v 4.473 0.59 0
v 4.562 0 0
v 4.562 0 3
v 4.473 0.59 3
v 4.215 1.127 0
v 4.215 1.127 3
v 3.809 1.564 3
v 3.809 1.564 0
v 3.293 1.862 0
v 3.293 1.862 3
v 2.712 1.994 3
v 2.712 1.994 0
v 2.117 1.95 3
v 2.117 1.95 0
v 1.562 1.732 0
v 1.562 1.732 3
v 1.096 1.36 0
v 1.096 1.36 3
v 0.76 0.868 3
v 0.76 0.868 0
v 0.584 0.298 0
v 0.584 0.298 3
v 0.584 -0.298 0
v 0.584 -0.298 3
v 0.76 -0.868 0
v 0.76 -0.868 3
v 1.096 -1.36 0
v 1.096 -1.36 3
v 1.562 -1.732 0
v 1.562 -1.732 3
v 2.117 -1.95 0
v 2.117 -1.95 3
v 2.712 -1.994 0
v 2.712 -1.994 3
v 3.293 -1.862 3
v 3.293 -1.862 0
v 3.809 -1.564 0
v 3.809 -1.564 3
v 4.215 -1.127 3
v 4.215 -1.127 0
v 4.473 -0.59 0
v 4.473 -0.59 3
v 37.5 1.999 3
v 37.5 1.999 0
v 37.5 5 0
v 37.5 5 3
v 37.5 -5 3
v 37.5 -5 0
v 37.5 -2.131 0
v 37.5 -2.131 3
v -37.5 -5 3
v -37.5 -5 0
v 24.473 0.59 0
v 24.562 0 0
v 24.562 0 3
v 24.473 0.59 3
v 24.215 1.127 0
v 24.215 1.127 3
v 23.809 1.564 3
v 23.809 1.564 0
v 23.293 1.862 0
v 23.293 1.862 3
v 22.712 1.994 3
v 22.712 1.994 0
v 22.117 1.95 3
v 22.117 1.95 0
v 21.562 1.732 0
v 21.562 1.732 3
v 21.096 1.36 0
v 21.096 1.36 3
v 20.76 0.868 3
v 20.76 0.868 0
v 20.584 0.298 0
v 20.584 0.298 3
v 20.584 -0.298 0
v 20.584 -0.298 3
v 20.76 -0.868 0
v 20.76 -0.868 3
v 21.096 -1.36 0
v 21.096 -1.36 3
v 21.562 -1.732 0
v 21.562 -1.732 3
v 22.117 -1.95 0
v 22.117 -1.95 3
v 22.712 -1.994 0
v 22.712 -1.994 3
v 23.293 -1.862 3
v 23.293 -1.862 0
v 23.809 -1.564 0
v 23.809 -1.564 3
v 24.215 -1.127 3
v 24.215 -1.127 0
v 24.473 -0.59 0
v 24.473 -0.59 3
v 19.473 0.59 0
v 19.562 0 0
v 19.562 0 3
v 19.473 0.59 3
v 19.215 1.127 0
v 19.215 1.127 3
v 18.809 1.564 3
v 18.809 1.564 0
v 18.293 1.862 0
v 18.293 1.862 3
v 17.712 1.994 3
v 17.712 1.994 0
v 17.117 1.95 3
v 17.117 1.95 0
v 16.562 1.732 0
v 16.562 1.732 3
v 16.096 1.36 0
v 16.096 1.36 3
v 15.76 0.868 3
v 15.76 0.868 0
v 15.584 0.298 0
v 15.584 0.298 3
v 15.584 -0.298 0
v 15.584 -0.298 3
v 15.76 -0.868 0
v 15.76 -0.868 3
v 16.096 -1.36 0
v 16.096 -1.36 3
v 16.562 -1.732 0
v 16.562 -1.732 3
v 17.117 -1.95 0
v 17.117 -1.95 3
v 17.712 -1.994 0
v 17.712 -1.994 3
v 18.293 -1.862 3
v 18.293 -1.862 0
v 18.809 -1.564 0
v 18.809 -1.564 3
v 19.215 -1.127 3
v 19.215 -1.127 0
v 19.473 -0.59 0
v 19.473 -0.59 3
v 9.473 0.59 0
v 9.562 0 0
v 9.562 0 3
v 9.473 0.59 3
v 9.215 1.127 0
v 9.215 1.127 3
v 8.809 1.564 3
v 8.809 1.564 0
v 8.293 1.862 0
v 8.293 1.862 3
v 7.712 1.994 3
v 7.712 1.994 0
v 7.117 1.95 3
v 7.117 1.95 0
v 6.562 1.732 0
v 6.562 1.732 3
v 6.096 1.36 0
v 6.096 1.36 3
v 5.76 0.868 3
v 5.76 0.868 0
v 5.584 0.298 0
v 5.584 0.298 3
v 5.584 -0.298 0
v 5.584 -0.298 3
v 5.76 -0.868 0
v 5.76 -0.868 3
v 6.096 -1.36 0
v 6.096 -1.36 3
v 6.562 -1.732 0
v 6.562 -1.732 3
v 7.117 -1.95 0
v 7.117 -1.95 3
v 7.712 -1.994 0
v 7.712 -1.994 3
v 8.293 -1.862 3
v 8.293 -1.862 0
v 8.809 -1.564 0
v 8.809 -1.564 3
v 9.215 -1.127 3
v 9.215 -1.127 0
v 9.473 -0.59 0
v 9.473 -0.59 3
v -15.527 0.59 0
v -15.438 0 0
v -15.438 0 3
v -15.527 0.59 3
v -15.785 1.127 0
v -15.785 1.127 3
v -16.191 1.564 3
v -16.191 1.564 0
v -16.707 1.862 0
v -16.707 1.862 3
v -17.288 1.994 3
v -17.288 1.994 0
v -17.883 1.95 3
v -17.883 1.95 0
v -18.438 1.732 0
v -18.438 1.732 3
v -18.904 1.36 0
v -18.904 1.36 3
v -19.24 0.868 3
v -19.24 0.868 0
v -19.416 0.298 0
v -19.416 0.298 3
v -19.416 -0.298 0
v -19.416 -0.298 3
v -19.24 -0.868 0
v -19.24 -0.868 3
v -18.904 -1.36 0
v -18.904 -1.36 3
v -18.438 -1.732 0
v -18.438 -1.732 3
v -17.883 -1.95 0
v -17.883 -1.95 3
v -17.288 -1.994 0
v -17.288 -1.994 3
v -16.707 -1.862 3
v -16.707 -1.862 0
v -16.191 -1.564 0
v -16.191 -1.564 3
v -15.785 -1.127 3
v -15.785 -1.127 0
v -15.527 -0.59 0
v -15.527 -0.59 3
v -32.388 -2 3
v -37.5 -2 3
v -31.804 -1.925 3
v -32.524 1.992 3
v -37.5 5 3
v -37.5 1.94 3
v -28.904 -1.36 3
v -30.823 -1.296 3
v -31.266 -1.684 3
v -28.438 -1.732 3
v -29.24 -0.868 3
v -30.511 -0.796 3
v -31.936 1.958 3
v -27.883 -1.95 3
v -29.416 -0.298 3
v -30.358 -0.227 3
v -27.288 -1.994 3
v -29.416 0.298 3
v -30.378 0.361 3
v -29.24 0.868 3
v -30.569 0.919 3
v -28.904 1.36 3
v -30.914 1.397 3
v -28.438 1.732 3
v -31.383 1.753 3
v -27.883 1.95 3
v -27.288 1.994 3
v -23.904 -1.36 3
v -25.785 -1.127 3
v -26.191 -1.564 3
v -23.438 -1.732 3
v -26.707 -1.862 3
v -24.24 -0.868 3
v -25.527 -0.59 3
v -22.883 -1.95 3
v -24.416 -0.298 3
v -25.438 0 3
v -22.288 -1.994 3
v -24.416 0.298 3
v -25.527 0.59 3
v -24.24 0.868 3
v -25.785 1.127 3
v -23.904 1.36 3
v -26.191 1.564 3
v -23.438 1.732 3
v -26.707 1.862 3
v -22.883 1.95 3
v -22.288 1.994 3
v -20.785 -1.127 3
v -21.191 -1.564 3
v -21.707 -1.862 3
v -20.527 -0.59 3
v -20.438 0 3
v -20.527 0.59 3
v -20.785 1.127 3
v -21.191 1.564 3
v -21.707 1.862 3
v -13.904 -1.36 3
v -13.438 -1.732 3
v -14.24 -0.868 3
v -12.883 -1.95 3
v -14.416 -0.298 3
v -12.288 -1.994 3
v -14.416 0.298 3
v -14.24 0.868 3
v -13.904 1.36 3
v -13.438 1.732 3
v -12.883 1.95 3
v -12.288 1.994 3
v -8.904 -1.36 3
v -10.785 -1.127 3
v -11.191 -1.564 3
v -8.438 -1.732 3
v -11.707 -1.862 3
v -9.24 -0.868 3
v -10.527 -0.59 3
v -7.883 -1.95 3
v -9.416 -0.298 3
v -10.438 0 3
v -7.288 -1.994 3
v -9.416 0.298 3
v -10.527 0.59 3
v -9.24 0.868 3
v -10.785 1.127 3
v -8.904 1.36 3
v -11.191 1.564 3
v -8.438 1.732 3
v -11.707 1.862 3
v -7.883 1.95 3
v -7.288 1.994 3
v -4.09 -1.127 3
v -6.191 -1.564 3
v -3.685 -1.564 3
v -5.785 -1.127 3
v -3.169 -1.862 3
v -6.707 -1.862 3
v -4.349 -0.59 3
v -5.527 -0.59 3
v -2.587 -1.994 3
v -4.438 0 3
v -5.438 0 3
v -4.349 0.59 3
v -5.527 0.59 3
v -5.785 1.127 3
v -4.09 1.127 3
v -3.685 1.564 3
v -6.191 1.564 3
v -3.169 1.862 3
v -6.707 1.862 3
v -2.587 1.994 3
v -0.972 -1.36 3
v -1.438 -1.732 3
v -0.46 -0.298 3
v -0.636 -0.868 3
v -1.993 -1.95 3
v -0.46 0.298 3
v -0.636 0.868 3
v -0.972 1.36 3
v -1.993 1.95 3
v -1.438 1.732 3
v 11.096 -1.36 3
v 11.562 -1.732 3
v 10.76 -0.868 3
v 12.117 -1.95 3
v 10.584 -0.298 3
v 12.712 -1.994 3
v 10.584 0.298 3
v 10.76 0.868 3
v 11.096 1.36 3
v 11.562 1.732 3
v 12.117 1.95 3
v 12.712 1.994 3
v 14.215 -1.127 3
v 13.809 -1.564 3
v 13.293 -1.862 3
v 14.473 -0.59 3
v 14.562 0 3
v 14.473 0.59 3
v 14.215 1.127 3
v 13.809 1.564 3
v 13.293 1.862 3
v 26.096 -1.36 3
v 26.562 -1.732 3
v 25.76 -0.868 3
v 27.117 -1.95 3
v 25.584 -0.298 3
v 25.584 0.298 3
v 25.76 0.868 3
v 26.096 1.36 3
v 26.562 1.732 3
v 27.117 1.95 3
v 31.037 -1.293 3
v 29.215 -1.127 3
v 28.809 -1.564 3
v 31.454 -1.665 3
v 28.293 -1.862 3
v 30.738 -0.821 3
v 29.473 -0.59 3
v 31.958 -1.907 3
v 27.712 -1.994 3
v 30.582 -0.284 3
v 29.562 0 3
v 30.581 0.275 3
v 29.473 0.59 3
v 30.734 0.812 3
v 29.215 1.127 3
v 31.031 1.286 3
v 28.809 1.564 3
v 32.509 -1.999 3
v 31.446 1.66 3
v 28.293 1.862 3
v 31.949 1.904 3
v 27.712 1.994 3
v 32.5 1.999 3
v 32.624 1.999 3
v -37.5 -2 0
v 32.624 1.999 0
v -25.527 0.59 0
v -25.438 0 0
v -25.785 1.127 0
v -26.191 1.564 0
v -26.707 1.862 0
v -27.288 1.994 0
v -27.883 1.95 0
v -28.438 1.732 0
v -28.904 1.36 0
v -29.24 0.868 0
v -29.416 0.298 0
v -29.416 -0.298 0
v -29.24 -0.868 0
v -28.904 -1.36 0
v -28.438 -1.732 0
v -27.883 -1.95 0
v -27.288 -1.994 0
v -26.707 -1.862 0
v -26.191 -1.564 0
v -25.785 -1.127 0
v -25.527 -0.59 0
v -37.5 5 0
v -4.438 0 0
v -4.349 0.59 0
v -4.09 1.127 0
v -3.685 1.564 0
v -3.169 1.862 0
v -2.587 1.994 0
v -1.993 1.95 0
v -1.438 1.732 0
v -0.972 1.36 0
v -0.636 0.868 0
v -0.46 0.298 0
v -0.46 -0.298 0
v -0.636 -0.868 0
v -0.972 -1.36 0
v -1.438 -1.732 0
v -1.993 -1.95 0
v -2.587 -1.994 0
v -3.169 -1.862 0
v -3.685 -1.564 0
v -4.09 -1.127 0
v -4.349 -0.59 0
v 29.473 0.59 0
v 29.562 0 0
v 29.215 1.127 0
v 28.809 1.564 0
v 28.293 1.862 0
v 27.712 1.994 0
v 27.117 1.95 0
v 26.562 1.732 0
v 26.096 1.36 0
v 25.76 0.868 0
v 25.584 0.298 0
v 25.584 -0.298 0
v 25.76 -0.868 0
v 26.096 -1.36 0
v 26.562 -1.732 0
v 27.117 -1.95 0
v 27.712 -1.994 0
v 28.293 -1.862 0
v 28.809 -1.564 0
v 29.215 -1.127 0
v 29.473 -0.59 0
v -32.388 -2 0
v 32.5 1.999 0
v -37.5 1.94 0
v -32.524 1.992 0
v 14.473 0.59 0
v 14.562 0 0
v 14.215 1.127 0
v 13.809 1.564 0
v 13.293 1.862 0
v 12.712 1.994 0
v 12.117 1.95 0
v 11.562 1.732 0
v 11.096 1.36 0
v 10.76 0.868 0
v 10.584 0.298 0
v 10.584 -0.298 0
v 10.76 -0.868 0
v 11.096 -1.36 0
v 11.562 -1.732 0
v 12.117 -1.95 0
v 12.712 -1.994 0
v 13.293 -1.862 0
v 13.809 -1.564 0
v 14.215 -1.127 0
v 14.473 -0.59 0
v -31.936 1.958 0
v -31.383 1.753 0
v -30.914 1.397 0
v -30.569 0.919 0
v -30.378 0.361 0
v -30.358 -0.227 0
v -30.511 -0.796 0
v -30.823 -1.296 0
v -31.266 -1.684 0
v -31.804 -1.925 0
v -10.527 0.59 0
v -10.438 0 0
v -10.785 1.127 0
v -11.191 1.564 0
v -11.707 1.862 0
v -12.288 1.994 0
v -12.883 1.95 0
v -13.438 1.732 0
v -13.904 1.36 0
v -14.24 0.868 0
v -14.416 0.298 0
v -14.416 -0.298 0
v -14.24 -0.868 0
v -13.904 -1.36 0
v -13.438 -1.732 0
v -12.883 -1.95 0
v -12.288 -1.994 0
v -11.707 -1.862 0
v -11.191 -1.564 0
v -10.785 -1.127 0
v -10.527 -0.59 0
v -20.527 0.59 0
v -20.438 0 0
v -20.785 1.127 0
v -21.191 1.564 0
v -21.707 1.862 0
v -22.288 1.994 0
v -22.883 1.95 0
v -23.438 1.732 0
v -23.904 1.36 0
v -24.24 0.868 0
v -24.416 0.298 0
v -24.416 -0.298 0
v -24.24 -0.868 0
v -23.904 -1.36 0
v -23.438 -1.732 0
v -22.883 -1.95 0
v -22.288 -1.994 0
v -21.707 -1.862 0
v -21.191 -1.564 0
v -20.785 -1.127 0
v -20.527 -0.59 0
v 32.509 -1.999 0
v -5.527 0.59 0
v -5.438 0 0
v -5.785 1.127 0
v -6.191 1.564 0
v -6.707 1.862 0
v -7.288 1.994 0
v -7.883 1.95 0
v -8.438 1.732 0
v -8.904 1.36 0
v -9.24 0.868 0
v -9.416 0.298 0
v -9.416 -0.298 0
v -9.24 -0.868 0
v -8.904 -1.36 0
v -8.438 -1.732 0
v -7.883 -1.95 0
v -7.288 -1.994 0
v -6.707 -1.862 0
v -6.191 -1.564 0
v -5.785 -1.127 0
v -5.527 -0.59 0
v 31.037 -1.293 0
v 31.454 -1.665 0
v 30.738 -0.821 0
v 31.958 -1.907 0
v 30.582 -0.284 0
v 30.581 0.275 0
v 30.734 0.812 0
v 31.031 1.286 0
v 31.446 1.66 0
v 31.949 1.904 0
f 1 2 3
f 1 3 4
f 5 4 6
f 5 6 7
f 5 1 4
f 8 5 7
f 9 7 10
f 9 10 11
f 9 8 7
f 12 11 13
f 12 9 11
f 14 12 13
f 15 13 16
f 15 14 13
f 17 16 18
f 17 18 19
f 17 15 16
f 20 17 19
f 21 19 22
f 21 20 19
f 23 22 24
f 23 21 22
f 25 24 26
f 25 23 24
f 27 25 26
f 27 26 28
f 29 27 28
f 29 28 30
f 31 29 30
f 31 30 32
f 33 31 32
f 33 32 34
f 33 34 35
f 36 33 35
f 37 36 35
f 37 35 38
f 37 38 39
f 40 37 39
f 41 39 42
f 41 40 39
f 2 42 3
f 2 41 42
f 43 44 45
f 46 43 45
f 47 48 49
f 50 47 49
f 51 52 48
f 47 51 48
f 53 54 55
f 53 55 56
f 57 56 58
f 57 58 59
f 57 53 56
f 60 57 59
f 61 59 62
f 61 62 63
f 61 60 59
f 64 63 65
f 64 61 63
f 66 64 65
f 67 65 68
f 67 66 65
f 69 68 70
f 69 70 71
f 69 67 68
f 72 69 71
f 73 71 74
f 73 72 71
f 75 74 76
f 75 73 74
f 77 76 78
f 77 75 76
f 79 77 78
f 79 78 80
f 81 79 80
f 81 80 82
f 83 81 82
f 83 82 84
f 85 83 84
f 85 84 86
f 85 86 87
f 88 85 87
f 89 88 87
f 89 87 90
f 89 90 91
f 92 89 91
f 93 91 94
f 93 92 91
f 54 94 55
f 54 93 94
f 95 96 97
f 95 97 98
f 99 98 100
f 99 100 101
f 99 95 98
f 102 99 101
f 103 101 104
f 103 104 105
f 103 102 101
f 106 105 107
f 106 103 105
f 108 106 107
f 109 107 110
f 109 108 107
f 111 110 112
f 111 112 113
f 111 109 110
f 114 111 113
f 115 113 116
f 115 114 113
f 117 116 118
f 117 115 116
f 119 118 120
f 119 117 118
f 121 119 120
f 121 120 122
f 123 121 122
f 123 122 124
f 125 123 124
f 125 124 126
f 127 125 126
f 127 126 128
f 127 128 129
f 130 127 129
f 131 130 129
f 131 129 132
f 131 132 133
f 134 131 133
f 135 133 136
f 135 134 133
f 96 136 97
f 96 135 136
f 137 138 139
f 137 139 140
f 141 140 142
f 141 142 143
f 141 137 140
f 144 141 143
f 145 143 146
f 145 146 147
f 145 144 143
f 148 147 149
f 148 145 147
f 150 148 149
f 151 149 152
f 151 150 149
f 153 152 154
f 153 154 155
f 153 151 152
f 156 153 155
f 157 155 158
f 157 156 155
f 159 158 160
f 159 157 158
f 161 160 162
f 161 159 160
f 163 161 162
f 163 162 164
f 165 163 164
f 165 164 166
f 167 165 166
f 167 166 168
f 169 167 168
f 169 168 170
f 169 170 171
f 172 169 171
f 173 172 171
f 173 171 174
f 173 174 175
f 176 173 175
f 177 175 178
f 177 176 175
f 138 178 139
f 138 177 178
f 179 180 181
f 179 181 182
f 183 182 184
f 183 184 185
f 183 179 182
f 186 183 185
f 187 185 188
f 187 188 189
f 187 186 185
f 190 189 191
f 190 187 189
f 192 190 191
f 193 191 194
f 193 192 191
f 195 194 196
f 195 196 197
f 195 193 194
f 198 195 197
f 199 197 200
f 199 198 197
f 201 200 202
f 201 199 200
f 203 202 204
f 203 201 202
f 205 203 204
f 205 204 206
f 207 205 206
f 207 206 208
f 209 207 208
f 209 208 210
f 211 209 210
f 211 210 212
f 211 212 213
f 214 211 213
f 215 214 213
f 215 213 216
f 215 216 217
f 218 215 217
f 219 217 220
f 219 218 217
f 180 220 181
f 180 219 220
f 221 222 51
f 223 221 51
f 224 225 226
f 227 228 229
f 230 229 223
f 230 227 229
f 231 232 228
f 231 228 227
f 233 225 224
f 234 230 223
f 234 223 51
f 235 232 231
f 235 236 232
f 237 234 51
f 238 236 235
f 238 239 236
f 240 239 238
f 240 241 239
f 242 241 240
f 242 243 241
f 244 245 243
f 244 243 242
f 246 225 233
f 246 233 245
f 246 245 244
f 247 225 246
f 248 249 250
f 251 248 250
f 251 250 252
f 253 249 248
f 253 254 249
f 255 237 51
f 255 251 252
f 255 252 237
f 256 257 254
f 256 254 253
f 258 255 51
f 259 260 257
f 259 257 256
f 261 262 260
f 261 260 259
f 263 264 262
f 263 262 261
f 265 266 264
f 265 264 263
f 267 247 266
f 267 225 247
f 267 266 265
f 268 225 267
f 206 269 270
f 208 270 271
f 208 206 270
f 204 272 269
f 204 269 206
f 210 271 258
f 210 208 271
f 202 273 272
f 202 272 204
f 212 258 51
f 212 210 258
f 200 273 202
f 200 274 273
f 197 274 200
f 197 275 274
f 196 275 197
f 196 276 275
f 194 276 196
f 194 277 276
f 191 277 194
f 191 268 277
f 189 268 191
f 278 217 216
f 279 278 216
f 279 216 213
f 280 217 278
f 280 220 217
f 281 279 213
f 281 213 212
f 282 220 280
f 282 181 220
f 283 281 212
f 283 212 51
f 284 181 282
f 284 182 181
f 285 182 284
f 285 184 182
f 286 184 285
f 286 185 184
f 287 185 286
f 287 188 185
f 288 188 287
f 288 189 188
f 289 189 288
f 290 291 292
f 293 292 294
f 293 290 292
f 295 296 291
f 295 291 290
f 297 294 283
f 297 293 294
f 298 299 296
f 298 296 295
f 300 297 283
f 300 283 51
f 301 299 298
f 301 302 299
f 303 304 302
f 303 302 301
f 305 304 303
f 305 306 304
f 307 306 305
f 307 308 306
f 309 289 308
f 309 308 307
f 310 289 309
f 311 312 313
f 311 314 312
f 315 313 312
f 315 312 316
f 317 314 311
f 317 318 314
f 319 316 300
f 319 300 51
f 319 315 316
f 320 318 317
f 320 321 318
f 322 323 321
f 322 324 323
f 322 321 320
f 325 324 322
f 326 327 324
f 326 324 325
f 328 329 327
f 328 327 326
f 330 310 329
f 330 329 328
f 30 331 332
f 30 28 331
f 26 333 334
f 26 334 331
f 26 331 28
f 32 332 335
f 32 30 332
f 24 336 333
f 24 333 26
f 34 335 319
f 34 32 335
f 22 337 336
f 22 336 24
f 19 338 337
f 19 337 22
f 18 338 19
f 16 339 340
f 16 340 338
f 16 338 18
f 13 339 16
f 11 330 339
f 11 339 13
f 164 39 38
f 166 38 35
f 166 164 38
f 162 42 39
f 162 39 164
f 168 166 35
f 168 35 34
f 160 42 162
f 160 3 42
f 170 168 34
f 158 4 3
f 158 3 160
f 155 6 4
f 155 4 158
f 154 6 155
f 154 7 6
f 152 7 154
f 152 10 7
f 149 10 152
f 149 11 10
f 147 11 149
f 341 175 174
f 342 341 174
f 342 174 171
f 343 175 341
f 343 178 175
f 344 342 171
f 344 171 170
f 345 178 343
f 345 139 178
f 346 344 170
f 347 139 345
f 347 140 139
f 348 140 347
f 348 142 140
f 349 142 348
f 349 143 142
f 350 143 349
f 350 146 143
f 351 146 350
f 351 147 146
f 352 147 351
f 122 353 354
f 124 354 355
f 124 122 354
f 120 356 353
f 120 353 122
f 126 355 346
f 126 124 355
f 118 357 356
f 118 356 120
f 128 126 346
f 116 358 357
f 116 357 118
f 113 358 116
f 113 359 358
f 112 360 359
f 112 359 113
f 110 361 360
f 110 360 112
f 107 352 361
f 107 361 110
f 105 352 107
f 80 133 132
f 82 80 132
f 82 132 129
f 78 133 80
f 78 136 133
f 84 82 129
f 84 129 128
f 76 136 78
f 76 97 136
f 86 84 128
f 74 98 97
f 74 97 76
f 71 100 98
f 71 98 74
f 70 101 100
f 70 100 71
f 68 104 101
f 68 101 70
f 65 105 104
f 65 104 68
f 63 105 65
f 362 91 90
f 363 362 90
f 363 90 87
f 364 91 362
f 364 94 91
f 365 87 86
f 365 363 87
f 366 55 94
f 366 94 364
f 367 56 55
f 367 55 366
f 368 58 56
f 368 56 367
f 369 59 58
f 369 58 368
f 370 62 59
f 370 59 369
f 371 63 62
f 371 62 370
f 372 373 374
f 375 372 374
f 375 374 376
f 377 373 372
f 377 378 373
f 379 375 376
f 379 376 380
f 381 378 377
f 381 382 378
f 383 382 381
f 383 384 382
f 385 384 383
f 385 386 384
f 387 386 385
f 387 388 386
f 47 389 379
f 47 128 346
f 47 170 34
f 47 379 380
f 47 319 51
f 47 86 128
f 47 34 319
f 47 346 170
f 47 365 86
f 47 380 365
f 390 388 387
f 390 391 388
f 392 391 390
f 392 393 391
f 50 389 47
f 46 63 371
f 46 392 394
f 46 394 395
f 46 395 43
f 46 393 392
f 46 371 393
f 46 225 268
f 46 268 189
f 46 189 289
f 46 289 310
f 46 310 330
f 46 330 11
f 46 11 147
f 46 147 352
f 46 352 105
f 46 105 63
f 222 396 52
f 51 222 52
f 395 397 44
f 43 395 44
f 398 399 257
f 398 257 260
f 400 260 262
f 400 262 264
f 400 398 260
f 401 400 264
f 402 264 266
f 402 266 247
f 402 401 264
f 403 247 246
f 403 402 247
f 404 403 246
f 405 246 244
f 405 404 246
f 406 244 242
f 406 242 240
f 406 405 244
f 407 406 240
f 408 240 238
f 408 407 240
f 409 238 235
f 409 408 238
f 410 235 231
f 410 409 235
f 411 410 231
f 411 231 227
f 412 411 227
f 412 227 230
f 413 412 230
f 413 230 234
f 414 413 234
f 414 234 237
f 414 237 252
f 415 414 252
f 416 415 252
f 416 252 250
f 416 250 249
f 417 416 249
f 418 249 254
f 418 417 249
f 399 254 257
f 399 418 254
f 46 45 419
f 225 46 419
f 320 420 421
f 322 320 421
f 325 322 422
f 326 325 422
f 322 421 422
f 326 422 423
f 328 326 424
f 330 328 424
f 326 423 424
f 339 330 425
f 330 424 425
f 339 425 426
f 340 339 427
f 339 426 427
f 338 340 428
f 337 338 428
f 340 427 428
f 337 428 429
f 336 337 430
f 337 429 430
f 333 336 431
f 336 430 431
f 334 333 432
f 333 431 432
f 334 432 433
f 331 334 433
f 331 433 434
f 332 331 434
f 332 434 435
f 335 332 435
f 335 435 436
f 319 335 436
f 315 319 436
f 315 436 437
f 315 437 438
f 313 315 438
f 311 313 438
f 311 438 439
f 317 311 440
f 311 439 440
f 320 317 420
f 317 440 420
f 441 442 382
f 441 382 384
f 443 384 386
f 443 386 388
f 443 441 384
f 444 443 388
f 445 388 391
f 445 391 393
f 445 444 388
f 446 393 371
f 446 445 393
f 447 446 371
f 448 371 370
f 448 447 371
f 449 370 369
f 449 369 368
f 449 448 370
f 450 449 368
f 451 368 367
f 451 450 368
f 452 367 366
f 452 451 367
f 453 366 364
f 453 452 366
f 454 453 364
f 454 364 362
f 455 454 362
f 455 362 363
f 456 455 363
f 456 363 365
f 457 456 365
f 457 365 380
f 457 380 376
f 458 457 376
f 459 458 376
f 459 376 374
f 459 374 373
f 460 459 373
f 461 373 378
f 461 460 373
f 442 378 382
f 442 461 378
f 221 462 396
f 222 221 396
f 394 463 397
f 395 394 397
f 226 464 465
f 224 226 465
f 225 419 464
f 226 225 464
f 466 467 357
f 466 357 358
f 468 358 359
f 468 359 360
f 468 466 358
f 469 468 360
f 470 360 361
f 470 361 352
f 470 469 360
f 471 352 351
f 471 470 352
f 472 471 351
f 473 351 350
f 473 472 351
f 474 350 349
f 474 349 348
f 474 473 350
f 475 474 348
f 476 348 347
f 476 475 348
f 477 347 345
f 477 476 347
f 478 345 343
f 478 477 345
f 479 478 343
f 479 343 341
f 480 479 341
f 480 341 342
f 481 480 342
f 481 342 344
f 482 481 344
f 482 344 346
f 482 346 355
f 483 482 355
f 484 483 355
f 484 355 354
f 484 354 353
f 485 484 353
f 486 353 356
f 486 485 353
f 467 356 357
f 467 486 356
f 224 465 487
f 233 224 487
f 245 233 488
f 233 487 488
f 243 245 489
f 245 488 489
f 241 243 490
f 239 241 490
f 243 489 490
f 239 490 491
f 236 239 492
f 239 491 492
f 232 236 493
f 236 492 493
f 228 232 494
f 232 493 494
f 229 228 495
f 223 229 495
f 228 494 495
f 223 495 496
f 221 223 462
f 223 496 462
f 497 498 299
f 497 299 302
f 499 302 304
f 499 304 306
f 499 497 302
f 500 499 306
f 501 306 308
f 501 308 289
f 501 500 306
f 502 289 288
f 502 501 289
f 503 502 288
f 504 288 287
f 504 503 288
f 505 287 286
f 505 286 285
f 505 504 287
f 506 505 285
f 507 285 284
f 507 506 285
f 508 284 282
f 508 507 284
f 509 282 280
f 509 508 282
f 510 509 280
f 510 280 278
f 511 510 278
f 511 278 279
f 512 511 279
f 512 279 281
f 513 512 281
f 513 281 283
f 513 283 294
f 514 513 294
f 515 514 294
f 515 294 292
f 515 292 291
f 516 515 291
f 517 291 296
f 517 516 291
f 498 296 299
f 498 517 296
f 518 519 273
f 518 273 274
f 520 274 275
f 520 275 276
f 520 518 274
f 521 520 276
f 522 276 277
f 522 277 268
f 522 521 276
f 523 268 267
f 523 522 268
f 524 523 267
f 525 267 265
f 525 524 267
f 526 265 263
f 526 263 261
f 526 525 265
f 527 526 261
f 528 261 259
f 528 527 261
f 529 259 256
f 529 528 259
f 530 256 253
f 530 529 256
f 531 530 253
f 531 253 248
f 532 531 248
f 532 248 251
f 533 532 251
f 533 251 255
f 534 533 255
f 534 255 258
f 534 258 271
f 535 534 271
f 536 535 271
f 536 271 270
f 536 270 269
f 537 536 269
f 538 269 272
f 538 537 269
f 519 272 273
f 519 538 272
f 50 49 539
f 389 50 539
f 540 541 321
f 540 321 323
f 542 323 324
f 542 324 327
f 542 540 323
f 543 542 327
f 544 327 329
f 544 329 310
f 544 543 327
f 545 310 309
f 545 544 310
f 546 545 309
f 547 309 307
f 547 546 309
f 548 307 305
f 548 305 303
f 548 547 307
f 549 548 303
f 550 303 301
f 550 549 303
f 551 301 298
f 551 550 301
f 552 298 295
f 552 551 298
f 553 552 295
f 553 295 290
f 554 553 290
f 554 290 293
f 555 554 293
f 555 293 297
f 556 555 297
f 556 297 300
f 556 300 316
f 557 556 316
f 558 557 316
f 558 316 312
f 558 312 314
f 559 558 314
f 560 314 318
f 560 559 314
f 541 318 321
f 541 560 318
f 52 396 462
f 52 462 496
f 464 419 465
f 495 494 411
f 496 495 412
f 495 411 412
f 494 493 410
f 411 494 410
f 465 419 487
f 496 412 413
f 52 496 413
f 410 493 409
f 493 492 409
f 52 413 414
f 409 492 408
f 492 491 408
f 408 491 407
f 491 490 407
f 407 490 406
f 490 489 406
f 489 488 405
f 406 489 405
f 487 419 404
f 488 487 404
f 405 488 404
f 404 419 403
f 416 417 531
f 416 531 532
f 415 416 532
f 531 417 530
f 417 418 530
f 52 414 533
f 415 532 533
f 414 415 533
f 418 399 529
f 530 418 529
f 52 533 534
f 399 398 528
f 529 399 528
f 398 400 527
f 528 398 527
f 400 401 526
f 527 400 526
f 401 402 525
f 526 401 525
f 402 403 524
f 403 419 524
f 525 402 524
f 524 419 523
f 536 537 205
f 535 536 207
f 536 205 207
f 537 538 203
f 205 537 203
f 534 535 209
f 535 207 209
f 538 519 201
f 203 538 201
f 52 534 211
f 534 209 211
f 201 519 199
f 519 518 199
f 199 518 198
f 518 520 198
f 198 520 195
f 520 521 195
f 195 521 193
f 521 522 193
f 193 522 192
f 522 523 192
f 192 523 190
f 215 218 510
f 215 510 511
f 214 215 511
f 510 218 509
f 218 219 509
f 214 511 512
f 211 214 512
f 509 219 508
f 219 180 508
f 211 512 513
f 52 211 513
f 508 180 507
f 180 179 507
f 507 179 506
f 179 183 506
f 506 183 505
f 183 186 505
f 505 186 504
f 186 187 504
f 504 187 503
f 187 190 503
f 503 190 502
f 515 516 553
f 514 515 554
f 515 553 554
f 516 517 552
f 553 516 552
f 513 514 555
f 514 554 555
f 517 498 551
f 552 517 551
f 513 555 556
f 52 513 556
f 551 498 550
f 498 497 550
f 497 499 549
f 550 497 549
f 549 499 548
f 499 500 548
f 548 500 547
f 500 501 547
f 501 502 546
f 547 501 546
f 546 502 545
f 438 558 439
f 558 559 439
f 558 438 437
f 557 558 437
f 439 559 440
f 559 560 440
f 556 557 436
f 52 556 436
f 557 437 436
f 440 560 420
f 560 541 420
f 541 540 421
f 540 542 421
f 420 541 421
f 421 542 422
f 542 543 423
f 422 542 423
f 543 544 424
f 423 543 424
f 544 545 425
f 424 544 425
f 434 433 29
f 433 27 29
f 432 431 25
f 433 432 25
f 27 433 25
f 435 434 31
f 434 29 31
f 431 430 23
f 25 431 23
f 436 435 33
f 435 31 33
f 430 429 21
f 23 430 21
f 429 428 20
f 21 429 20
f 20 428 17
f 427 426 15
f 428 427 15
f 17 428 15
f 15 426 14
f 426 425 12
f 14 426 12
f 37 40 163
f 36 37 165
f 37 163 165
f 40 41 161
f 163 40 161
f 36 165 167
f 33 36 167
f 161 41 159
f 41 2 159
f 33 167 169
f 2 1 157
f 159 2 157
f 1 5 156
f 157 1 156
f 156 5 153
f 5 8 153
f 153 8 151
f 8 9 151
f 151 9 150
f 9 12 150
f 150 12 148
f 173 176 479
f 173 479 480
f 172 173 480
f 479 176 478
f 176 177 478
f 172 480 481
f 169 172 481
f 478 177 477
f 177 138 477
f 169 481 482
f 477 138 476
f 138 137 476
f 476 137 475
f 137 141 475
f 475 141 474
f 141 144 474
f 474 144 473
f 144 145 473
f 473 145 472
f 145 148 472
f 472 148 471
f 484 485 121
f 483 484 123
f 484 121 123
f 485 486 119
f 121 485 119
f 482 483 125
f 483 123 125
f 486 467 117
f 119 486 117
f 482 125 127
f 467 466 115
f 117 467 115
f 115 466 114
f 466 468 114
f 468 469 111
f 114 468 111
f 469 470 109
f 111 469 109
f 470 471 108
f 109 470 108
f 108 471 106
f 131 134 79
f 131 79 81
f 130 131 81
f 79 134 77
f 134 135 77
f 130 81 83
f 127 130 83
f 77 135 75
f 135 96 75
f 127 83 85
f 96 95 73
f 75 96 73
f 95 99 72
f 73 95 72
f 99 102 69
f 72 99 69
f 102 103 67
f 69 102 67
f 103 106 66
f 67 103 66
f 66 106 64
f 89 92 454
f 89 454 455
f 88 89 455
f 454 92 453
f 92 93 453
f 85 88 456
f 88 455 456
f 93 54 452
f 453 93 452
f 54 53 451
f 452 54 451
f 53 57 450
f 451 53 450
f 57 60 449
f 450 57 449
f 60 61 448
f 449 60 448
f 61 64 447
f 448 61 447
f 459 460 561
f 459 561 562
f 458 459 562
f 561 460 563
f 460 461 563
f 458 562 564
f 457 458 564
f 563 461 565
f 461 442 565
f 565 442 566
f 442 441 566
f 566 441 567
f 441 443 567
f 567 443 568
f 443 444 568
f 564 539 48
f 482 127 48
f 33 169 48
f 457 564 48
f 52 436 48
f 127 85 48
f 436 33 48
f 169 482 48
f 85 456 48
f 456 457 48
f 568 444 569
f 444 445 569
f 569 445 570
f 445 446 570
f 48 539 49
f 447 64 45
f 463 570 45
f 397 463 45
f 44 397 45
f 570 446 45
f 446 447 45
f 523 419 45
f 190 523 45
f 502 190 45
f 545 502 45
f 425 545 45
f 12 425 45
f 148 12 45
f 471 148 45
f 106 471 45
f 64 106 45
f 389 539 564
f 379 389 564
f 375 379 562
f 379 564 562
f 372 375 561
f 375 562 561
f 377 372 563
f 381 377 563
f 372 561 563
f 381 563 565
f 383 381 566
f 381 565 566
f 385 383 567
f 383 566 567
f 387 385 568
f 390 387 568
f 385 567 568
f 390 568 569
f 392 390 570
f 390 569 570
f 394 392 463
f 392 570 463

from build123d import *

# Parameters (mm, degrees)
F0_R     = 2
F1_DEPTH = 3


with BuildPart() as f1:
    # F0 (on Top) → F1 (new body)
    with BuildSketch(Plane.XY):
        with BuildLine():
            Line((-37.5, -5), (37.5, -5))
            Line((37.5, -5), (37.5, -2.131387))
            Line((37.5, -2.131387), (32.50913, -1.9993))
            ThreePointArc((32.50913, -1.9993), (30.562048, -0.004567), (32.5, 1.999037))
            ThreePointArc((32.5, 1.999037), (32.562172, 2), (32.624343, 1.999029))
            Line((32.624343, 1.999029), (37.5, 1.998715))
            Line((37.5, 1.998715), (37.5, 5))
            Line((37.5, 5), (-37.5, 5))
            Line((-37.5, 5), (-37.5, 1.939646))
            Line((-37.5, 1.939646), (-32.523661, 1.992048))
            ThreePointArc((-32.523661, 1.992048), (-30.346636, 0.067762), (-32.388344, -1.999541))
            Line((-32.388344, -1.999541), (-37.5, -1.999541))
            Line((-37.5, -1.999541), (-37.5, -5))
        make_face()
        with Locations((-27.437957, 0)):
            Circle(F0_R, mode=Mode.SUBTRACT)
        with Locations((-22.437957, 0)):
            Circle(F0_R, mode=Mode.SUBTRACT)
        with Locations((-17.437957, 0)):
            Circle(F0_R, mode=Mode.SUBTRACT)
        with Locations((-12.437957, 0)):
            Circle(F0_R, mode=Mode.SUBTRACT)
        with Locations((-7.437957, 0)):
            Circle(F0_R, mode=Mode.SUBTRACT)
        with BuildLine():
            ThreePointArc((-0.437957, 0), (-2.437957, -2), (-4.437957, 0))
            ThreePointArc((-4.437957, 0), (-2.437957, 2), (-0.437957, 0))
        make_face(mode=Mode.SUBTRACT)
        with Locations((2.562043, 0)):
            Circle(F0_R, mode=Mode.SUBTRACT)
        with Locations((7.562043, 0)):
            Circle(F0_R, mode=Mode.SUBTRACT)
        with Locations((12.562043, 0)):
            Circle(F0_R, mode=Mode.SUBTRACT)
        with Locations((17.562043, 0)):
            Circle(F0_R, mode=Mode.SUBTRACT)
        with Locations((22.562043, 0)):
            Circle(F0_R, mode=Mode.SUBTRACT)
        with Locations((27.562043, 0)):
            Circle(F0_R, mode=Mode.SUBTRACT)
        with BuildLine():
            ThreePointArc((32.624343, 1.999029), (32.562172, 2), (32.5, 1.999037))
            Line((32.5, 1.999037), (32.624343, 1.999029))
        make_face()
    extrude(amount=F1_DEPTH)


solid = f1.part
